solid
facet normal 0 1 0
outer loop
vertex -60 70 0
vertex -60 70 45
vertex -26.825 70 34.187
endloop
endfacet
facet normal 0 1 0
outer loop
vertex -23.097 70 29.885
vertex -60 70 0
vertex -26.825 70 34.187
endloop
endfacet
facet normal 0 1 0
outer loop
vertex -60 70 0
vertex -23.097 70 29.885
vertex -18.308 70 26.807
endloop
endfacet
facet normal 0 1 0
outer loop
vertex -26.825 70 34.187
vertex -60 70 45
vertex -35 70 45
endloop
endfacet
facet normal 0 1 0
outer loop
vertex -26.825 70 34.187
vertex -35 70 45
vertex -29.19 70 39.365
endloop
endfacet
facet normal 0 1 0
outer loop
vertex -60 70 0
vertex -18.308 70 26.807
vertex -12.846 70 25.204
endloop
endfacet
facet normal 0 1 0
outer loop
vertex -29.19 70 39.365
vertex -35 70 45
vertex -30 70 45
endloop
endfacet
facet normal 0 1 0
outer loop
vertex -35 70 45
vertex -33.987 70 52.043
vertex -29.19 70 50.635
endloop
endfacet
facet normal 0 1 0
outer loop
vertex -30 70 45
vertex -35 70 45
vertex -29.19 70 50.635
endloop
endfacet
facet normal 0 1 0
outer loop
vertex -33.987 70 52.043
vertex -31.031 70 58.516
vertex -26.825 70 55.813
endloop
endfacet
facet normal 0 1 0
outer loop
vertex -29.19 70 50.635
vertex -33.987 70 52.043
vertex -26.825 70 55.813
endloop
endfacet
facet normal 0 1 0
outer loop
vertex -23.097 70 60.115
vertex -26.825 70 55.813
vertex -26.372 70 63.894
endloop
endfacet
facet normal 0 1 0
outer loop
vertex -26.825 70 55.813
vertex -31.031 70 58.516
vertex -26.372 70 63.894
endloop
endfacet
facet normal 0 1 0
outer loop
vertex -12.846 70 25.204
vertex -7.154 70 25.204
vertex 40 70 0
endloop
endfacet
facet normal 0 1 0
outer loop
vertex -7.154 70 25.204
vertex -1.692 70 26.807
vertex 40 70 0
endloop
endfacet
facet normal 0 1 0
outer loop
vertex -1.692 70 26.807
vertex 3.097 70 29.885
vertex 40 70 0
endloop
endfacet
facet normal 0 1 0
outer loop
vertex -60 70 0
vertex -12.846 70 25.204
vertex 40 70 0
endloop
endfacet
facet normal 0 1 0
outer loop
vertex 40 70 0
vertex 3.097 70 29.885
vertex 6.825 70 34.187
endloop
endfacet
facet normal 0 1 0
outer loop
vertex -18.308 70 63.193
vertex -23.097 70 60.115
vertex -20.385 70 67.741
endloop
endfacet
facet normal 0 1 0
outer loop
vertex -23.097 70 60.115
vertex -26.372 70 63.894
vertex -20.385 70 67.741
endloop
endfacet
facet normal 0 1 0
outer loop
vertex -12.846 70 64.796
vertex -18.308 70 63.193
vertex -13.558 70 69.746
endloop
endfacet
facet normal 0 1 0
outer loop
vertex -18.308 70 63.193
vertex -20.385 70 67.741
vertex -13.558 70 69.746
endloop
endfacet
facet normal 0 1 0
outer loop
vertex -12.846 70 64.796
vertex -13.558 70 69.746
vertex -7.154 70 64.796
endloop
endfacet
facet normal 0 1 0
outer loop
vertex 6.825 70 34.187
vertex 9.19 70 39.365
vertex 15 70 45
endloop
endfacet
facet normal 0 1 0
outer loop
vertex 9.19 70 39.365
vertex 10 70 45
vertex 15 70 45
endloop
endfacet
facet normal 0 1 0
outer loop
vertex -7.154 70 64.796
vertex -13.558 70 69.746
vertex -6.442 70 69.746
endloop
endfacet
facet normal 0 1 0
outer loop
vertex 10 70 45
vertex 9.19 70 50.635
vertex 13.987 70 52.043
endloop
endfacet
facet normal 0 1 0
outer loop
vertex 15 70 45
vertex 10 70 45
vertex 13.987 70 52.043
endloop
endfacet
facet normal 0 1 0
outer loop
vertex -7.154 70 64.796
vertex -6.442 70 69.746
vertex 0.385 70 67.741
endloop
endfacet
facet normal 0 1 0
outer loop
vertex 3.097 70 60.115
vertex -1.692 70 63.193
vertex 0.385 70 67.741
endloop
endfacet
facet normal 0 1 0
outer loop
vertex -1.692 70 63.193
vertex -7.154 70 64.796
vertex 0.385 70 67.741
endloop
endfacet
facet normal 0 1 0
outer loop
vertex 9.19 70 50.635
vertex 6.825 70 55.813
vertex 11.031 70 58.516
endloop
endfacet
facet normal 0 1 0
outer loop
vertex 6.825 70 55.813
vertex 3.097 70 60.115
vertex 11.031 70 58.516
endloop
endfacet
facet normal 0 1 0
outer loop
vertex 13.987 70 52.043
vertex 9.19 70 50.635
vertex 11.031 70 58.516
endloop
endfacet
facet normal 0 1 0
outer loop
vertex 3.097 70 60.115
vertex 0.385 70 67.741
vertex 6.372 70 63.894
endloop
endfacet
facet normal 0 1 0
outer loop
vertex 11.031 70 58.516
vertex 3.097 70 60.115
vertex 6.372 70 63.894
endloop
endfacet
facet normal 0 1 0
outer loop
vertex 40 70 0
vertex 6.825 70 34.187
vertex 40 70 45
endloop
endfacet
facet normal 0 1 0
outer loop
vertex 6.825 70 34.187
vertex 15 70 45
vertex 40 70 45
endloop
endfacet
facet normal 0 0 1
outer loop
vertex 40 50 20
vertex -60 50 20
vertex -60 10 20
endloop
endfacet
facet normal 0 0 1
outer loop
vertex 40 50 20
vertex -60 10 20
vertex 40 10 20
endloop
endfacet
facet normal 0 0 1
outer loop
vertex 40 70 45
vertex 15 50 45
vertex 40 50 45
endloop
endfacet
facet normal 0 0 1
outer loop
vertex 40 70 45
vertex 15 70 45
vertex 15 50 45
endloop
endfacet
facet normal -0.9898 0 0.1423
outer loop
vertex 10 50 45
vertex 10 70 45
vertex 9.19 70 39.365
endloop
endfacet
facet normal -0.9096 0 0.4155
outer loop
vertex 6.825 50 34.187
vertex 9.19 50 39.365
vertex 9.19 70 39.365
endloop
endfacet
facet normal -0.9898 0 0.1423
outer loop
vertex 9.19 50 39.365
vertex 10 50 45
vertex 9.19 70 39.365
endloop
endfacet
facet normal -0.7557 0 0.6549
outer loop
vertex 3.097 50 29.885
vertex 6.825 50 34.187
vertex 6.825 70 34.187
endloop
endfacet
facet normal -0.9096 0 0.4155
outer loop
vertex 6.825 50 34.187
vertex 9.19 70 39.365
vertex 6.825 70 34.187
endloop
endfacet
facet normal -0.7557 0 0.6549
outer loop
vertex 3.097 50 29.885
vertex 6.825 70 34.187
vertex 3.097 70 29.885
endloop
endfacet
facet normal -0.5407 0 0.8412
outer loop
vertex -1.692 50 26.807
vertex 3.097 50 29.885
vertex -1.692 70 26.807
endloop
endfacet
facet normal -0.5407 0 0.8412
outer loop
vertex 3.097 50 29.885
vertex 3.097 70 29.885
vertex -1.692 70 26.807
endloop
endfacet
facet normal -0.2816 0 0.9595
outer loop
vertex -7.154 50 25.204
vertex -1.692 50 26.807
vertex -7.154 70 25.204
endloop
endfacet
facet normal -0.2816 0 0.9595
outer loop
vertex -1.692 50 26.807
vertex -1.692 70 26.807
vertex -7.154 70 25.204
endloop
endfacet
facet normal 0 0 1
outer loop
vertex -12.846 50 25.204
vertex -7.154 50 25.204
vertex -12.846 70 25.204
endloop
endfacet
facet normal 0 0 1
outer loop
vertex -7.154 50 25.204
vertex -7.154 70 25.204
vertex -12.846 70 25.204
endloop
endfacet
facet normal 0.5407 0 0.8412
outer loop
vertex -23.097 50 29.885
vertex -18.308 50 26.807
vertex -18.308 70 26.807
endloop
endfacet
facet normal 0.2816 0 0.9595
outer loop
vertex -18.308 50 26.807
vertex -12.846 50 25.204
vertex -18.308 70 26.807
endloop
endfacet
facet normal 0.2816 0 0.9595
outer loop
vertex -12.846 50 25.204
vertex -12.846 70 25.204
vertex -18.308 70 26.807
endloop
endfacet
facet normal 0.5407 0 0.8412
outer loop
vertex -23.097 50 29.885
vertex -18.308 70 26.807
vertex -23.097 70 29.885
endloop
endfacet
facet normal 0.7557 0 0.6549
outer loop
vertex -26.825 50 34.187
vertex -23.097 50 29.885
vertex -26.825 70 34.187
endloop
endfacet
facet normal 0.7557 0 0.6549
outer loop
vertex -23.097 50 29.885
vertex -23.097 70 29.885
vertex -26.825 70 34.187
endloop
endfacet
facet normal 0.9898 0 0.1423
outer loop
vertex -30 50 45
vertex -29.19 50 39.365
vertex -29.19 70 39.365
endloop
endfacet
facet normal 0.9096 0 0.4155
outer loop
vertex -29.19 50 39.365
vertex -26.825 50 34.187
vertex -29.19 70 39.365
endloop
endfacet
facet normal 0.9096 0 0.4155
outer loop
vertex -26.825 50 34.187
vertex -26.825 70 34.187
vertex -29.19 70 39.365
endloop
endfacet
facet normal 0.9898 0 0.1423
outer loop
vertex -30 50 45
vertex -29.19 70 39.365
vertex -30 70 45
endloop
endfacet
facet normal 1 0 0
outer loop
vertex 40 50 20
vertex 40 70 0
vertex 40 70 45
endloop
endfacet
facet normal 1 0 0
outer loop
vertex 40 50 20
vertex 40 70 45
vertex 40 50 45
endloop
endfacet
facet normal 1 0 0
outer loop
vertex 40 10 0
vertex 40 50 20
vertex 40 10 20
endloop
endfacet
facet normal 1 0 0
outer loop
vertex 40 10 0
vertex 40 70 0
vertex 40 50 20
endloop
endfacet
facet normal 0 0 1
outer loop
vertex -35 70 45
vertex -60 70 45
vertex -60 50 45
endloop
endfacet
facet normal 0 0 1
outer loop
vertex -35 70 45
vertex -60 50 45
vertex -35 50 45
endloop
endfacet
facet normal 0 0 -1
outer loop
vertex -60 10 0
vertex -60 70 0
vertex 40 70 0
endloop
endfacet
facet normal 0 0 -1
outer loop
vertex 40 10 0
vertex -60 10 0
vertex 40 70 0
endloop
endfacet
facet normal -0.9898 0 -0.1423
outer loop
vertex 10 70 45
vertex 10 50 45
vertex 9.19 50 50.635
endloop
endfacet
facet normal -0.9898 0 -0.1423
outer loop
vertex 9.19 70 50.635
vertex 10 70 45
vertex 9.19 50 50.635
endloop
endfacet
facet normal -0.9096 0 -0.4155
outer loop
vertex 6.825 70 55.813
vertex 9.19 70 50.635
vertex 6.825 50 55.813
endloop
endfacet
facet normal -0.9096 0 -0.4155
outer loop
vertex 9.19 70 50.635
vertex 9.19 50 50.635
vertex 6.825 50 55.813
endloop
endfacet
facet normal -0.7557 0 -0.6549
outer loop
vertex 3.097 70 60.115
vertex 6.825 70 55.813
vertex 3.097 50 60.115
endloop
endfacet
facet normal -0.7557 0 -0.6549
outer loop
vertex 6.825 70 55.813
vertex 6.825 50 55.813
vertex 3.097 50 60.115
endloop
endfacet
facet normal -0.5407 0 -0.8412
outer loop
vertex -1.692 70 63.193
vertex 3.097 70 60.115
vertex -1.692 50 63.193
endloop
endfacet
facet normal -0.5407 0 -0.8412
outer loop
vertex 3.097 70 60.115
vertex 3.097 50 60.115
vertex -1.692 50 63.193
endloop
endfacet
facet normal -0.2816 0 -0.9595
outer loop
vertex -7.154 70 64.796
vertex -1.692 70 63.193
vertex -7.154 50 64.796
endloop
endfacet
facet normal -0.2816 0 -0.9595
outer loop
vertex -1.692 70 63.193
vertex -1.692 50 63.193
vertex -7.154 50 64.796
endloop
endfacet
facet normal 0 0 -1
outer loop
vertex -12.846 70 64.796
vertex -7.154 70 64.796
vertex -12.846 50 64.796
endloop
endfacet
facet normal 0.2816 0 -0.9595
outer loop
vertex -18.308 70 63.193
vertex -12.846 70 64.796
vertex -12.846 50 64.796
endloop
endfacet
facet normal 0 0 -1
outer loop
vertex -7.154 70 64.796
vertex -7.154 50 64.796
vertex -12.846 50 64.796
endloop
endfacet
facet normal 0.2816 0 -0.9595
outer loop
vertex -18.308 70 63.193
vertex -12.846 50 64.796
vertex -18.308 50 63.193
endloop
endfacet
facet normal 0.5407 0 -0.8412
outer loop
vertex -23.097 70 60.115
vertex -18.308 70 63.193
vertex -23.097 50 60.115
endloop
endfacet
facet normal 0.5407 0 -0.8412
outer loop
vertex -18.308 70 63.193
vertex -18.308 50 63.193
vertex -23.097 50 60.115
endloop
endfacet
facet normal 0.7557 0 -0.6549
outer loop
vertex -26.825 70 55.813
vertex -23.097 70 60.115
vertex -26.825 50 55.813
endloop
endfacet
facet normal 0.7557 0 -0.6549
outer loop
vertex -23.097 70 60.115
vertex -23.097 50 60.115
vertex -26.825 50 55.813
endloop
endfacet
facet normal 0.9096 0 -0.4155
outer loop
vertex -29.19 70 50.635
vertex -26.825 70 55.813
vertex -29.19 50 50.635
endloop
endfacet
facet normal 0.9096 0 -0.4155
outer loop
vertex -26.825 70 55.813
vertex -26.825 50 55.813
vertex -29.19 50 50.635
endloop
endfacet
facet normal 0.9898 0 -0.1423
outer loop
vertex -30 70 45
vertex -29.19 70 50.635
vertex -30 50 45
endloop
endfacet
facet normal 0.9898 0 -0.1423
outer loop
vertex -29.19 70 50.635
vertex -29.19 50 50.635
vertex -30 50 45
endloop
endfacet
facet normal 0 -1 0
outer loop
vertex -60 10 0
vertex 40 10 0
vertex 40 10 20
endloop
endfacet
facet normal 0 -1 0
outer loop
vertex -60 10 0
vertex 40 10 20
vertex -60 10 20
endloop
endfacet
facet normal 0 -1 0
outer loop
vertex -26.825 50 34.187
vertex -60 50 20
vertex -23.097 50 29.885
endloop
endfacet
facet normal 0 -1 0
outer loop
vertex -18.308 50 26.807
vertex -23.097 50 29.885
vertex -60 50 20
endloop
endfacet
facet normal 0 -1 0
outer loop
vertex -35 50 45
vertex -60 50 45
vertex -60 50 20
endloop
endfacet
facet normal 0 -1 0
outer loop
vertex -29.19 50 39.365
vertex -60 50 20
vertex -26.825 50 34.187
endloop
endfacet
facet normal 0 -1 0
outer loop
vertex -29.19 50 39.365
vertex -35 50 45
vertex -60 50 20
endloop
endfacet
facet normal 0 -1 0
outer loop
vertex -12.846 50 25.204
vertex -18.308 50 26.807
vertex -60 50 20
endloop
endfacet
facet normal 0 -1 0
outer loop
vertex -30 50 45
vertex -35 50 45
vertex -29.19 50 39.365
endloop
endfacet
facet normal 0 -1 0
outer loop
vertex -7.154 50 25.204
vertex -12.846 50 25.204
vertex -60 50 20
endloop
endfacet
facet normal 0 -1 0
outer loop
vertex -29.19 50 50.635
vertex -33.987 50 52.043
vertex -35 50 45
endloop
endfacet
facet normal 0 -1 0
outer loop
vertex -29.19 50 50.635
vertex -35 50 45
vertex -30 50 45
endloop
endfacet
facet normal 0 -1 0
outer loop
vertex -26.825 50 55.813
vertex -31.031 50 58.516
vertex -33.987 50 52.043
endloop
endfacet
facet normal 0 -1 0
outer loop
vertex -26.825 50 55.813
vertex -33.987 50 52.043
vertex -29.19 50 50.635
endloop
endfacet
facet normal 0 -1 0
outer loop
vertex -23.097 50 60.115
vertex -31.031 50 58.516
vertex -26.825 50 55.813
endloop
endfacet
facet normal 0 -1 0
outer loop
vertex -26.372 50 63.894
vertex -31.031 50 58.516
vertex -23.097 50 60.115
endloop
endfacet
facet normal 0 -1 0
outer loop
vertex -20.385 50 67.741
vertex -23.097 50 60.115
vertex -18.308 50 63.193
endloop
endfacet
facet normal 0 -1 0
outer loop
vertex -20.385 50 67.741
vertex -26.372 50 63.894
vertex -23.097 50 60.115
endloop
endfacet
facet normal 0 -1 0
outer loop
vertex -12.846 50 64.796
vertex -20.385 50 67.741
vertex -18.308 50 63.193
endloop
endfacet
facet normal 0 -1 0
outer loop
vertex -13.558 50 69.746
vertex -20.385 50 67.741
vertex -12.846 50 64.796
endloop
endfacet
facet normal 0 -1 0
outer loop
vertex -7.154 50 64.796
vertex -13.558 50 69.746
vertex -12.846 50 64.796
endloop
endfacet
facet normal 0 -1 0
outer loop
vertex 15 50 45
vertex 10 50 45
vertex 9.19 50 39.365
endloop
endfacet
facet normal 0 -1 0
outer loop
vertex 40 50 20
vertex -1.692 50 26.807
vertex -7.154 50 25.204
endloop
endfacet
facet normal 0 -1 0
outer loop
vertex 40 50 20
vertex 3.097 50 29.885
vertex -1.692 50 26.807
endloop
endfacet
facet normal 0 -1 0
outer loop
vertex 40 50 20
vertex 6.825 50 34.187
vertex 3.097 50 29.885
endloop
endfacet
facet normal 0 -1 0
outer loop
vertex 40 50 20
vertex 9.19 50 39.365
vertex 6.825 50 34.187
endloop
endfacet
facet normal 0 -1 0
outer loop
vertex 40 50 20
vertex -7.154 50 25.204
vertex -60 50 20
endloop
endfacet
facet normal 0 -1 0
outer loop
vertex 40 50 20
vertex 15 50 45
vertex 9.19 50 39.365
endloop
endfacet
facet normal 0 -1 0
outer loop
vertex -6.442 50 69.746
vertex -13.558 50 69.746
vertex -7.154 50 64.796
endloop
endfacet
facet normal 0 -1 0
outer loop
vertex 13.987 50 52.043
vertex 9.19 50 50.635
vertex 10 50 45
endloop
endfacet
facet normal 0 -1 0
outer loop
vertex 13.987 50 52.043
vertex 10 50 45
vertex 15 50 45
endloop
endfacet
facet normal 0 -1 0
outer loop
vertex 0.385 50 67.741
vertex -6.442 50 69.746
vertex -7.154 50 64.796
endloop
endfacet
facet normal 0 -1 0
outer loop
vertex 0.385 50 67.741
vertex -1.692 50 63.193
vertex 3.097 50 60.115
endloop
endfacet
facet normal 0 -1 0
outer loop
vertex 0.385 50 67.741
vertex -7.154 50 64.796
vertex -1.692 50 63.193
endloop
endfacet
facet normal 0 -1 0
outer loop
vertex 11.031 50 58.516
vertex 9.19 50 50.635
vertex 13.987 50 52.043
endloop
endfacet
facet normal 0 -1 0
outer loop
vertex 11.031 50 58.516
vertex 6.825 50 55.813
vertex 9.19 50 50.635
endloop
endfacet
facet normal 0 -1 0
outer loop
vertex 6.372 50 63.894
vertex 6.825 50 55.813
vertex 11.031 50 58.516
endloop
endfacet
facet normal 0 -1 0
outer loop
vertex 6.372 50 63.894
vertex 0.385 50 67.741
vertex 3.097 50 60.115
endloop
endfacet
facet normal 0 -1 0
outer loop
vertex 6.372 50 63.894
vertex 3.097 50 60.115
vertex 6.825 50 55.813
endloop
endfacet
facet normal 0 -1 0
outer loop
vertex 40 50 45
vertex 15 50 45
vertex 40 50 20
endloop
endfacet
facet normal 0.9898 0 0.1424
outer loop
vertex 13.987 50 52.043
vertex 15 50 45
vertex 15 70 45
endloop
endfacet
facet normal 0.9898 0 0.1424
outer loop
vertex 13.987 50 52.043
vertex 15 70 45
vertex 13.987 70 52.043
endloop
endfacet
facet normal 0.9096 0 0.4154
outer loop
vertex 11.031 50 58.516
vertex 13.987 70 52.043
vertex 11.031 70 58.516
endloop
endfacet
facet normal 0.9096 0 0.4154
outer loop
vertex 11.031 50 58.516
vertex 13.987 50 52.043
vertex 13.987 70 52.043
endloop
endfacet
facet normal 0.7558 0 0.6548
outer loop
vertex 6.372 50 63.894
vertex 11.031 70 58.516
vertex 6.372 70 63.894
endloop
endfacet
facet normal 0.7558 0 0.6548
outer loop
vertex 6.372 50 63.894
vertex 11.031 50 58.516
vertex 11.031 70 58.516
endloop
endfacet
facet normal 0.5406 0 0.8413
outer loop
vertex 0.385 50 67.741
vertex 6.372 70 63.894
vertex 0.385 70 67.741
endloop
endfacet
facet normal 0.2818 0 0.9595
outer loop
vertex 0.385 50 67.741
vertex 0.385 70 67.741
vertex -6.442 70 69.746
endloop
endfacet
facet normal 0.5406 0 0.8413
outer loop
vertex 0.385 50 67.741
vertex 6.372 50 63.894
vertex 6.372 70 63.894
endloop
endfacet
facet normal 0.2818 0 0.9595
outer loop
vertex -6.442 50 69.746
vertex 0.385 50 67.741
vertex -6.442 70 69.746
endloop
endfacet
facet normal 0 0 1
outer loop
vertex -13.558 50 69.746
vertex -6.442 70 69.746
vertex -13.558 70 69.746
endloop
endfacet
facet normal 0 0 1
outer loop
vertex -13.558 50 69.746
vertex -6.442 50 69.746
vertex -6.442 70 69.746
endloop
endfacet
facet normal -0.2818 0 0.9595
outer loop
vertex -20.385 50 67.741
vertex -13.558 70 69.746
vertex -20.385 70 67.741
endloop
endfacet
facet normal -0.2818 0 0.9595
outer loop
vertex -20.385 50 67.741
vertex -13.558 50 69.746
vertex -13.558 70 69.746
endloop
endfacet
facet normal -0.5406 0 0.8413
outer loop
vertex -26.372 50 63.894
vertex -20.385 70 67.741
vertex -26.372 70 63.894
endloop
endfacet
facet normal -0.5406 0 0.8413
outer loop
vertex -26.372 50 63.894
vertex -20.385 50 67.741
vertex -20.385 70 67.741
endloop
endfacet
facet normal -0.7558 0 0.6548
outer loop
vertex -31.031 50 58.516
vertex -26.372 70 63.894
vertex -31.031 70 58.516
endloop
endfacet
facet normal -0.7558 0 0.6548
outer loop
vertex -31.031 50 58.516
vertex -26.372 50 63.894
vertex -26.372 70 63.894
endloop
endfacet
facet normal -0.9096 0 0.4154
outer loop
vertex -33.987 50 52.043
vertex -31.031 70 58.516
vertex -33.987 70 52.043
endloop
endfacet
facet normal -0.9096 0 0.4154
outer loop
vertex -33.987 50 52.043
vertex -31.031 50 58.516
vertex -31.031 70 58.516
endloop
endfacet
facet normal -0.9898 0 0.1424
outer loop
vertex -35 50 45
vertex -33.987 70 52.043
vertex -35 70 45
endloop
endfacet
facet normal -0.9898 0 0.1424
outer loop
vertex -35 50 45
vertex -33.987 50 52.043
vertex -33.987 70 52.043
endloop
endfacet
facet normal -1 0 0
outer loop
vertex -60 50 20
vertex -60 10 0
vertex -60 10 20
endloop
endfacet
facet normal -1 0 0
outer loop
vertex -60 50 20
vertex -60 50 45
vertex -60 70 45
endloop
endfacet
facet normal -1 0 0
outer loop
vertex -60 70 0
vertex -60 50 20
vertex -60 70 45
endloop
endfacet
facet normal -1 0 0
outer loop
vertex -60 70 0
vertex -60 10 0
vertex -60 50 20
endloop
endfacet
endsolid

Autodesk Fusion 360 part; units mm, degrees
sketch "Sketch1" plane through (0, 0, 0) normal (0, 0, 1) x (1, 0, 0)
  line L0 (-60, 70) -> (40, 70)
  line L1 (40, 70) -> (40, 10)
  line L2 (40, 10) -> (-60, 10)
  line L3 (-60, 10) -> (-60, 70)
  line L4 (-60, 70) -> (40, 70)
  line L5 (40, 70) -> (40, 50)
  line L6 (40, 50) -> (-60, 50)
  line L7 (-60, 50) -> (-60, 70)
  line L8 (-60, 70) -> (-35, 70)
  line L9 (-35, 70) -> (15, 70)
  line L10 (15, 70) -> (15, 50)
  line L11 (15, 50) -> (-35, 50)
  line L12 (-35, 50) -> (-35, 70)
  dimension "d1" = 100
  dimension "d2" = 60
extrude "Extrude1" add sketch "Sketch1" along normal blind 20 contours L1 L2 L3 L6 L11
extrude "Extrude2" add sketch "Sketch1" along normal blind 45 contours L0 L3 L4 L6 L7 L8 L12
extrude "Extrude3" add sketch "Sketch1" along normal blind 45 contours L0 L1 L4 L5 L6 L10
extrude "Extrude4" add sketch "Sketch1" along normal blind 45 contours L0 L4 L6 L9 L10 L11 L12
sketch "Sketch2" plane through (0, 50, 0) normal (0, -1, 0) x (1, 0, 0)
  line L0 (-60, 20) -> (40, 20)
  line L1 (40, 20) -> (40, 45)
  line L2 (40, 45) -> (-60, 45)
  line L3 (-60, 45) -> (-60, 20)
sketch "Sketch3" plane through (0, 50, 0) normal (0, -1, 0) x (1, 0, 0)
  line L0 (-35, 45) -> (-30, 45)
  circle A0 centre (-10, 45) radius 20
  line L1 (10, 45) -> (15, 45)
  arc A1 (15, 45) -> (-35, 45) centre (-10, 45) ccw
  dimension "d12" = 40
  dimension "d13" = 50
hole "Hole1" at (-10, 50, 45) direction (0, 1, 0) diameter 40 depth 600 tip angle 118
extrude "Extrude5" add sketch "Sketch3" against normal blind 20 contours L0 A0 L1 A1
